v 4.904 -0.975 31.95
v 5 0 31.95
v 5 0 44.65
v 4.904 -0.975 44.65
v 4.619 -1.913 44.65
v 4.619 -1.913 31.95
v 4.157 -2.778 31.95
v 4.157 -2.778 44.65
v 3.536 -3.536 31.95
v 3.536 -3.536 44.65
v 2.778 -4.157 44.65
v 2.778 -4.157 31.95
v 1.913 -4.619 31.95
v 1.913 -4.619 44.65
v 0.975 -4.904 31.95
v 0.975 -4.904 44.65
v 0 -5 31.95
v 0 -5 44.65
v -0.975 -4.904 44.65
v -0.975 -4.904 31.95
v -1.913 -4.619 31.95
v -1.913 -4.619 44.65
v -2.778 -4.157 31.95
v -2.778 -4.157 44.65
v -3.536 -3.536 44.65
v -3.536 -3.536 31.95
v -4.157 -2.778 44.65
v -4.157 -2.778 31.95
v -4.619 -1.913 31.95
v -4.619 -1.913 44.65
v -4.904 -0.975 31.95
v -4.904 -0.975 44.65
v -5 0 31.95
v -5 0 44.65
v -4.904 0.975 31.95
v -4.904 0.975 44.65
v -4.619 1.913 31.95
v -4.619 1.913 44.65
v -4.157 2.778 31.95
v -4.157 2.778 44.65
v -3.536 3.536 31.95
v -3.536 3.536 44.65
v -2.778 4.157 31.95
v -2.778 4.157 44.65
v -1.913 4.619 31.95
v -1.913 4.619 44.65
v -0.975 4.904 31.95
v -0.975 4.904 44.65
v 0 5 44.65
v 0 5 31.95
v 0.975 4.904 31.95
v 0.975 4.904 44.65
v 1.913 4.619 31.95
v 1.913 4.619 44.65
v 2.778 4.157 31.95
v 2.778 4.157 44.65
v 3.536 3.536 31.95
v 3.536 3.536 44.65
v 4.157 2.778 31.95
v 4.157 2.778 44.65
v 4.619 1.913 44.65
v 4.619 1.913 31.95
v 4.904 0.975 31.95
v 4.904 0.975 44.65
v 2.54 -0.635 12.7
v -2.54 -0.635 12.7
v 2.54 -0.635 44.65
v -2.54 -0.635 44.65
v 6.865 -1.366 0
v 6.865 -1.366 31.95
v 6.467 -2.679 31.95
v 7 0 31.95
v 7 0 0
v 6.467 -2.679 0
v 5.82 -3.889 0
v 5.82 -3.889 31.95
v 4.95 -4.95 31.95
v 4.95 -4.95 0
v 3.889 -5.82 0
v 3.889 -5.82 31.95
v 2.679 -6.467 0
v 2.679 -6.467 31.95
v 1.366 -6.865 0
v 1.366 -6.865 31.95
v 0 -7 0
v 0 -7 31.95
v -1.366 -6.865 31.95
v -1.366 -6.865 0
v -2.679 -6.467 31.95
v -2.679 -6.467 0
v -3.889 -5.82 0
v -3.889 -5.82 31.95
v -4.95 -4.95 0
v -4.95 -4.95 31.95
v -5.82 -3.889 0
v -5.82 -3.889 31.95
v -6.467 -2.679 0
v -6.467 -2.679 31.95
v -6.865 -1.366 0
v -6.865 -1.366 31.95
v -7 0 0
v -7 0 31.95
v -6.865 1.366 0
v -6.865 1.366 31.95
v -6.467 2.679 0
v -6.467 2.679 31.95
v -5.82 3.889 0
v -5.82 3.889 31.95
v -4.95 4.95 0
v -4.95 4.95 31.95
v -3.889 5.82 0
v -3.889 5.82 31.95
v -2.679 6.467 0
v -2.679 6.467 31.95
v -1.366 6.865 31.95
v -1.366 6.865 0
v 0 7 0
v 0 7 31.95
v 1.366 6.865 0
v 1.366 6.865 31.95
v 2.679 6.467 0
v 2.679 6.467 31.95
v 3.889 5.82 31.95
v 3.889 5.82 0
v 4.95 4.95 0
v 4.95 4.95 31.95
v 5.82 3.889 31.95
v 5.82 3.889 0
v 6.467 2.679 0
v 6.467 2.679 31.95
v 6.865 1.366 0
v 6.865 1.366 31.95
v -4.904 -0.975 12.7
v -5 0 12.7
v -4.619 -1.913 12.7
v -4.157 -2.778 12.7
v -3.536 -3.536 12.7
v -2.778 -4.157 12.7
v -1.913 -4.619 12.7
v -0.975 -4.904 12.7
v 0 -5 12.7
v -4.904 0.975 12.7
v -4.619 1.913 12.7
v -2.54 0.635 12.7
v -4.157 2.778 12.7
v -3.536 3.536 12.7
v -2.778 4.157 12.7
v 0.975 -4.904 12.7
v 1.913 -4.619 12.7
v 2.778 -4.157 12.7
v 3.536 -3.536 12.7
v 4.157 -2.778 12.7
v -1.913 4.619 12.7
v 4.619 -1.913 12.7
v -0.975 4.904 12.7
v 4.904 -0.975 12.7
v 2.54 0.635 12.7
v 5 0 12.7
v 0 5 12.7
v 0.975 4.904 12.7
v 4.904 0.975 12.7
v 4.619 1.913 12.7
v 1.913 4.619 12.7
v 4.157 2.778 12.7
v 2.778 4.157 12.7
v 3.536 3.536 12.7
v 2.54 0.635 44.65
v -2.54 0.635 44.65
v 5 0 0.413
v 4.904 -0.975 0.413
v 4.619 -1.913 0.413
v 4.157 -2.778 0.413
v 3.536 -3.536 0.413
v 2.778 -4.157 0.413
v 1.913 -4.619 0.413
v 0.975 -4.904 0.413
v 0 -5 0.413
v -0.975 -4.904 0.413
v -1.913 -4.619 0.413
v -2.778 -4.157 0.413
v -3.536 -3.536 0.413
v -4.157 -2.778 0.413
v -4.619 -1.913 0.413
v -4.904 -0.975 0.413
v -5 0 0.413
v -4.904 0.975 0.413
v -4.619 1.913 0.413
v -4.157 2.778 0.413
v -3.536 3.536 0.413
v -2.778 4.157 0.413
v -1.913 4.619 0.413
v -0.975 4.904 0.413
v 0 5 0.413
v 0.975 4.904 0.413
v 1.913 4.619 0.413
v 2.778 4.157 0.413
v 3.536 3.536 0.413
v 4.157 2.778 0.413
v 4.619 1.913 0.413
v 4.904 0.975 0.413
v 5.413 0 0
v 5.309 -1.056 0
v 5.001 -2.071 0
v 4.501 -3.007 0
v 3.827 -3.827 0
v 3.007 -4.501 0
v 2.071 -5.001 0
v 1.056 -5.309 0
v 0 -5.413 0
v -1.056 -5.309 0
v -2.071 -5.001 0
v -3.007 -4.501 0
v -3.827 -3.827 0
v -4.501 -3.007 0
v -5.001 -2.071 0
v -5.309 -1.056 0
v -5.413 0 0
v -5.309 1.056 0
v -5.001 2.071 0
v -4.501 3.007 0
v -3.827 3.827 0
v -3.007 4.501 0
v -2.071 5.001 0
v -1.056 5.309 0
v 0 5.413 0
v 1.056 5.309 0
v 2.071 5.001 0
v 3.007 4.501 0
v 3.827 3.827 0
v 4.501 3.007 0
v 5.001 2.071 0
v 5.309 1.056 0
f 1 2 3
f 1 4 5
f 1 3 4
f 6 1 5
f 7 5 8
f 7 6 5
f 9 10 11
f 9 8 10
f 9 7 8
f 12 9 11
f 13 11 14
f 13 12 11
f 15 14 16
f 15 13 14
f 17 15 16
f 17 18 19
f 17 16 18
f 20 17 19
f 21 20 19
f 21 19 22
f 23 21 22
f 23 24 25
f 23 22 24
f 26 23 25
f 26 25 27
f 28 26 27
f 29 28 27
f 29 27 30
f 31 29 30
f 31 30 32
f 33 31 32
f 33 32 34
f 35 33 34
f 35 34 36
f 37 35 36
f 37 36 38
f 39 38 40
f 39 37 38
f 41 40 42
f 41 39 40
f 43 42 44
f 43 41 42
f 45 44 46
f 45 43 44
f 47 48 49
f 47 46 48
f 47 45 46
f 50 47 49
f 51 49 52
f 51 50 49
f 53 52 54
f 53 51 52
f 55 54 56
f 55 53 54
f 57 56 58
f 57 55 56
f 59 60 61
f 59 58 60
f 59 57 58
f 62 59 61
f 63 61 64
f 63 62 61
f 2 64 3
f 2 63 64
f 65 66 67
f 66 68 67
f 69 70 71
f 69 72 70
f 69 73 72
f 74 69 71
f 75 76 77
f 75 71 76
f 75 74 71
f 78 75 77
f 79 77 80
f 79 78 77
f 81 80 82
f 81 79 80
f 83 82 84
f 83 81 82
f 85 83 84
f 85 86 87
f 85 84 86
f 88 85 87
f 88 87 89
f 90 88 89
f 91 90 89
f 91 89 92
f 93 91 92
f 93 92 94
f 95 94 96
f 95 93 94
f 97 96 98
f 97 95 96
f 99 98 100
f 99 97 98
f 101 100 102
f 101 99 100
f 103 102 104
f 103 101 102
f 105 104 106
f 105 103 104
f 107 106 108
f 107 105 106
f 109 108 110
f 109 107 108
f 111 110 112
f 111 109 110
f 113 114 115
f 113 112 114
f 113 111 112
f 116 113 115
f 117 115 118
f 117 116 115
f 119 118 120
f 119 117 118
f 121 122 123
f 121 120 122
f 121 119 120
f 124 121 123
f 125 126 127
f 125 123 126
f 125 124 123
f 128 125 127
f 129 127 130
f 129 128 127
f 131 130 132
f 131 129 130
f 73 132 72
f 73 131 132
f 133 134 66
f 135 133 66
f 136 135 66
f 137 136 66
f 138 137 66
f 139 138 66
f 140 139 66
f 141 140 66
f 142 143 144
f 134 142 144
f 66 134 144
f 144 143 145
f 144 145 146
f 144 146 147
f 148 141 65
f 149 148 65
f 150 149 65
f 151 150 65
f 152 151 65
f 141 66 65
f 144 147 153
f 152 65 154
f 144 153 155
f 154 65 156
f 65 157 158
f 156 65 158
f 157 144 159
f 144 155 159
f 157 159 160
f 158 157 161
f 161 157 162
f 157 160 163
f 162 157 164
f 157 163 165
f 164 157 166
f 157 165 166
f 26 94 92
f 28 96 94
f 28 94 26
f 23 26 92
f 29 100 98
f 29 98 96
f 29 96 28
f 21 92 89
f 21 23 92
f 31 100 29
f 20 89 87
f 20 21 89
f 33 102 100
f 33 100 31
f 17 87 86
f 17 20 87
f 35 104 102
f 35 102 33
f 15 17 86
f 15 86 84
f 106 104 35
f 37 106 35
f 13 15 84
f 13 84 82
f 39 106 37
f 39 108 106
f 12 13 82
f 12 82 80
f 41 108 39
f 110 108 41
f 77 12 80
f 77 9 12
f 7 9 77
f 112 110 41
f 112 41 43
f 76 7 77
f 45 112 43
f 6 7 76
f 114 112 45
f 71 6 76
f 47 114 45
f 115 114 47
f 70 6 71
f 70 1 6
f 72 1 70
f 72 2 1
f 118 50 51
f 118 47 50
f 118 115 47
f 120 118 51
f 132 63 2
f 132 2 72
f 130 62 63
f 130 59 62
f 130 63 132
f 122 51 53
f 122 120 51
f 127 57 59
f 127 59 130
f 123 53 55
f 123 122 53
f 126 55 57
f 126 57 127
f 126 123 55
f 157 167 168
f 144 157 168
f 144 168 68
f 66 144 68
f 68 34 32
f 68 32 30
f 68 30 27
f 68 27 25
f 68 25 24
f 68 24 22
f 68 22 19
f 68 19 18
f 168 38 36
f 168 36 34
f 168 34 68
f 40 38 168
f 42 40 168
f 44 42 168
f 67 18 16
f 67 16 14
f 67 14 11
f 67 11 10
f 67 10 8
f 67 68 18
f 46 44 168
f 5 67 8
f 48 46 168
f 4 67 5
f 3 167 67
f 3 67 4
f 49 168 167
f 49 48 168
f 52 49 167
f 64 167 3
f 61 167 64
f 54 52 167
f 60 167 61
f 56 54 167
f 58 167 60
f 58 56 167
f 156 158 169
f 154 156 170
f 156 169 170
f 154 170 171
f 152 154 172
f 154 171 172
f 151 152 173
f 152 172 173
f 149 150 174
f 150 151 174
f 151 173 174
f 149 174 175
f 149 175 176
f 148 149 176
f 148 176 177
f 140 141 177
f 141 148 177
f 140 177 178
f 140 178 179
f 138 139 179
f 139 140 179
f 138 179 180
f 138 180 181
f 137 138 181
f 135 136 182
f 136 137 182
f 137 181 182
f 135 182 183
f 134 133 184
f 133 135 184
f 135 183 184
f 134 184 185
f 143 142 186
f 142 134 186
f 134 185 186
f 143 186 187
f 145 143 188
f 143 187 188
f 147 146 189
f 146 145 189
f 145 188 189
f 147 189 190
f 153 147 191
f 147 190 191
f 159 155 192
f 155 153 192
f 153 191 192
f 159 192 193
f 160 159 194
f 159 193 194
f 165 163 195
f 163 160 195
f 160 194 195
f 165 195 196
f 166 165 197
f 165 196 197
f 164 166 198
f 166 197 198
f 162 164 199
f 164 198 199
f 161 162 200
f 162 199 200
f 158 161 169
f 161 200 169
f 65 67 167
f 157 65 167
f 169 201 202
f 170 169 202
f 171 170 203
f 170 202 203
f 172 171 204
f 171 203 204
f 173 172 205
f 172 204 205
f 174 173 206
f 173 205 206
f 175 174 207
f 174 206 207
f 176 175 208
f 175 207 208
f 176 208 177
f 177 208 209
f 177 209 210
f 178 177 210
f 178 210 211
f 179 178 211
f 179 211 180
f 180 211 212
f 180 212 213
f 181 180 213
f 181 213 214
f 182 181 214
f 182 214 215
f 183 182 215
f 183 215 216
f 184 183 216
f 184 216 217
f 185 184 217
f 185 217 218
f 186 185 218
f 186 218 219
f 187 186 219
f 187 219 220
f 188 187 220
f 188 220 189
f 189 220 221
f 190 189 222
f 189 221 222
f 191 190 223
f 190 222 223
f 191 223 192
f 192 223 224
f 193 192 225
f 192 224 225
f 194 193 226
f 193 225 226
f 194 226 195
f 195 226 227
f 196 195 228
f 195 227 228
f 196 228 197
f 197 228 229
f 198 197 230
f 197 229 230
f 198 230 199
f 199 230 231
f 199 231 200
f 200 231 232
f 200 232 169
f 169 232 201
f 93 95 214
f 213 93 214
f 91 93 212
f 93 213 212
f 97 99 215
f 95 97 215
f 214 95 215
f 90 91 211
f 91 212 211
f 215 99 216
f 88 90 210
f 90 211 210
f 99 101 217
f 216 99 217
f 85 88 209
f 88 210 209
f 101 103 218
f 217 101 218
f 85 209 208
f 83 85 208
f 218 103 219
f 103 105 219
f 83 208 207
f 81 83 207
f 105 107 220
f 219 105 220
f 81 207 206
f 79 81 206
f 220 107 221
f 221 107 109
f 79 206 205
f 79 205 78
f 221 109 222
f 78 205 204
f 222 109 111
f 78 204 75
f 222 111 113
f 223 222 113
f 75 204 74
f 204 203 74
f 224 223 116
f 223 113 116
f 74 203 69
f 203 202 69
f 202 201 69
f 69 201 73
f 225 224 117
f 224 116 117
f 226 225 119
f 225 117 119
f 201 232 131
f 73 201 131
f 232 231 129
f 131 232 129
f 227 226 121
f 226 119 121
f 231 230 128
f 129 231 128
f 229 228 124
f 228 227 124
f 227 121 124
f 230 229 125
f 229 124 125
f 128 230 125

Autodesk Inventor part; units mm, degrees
ref_plane "YZ Plane" through (0, 0, 0) normal (1, 0, 0) x (0, 1, 0)
ref_plane "XZ Plane" through (0, 0, 0) normal (0, 1, 0) x (-1, 0, 0)
ref_plane "XY Plane" through (0, 0, 0) normal (0, 0, 1) x (1, 0, 0)
sketch "Sketch1" plane through (0, 0, 0) normal (0, 0, 1) x (1, 0, 0)
  circle A0 centre (0, 0) radius 5
  circle A1 centre (0, 0) radius 7
  dimension "d0" = 10
  dimension "d1" = 14
extrude "Extrusion1" add sketch "Sketch1" along normal blind 12.7
sketch "Sketch2" plane through (0, 0, 12.7) normal (0, 0, 1) x (1, 0, 0)
  circle A0 centre (0, 0) radius 7
  dimension "d14" = 14
extrude "Extrusion2" add sketch "Sketch2" along normal blind 19.25
chamfer "Chamfer1" distance 0.4128 angle 45 1 edges at (-5, 0, 0)
thread "Thread1" size "7/16-14 UNC" class "2B" standard "ANSI Unified Screw Threads" full length
sketch "Sketch3" plane through (0, 0, 31.95) normal (0, 0, 1) x (1, 0, 0)
  circle A0 centre (0, 0) radius 5
  dimension "d11" = 10
extrude "Extrusion3" add sketch "Sketch3" along normal blind 12.7
thread "Thread2" size "7/16-14 UNC" class "2A" standard "ANSI Unified Screw Threads" full length
sketch "Sketch4" plane through (0, 0, 44.65) normal (0, 0, 1) x (1, 0, 0)
  line L0 (2.54, 0.635) -> (-2.54, 0.635)
  line L1 (-2.54, 0.635) -> (-2.54, -0.635)
  line L2 (-2.54, -0.635) -> (2.54, -0.635)
  line L3 (2.54, -0.635) -> (2.54, 0.635)
  line L4 (2.54, 0.635) -> (-2.54, -0.635) construction
  line L5 (-2.54, 0.635) -> (2.54, -0.635) construction
  point P0 (0, 0)
  dimension "d17" = 5.08
  dimension "d18" = 1.27
extrude "Extrusion4" cut sketch "Sketch4" against normal through all
properties part number "Pedal Shaft Extender Right"
